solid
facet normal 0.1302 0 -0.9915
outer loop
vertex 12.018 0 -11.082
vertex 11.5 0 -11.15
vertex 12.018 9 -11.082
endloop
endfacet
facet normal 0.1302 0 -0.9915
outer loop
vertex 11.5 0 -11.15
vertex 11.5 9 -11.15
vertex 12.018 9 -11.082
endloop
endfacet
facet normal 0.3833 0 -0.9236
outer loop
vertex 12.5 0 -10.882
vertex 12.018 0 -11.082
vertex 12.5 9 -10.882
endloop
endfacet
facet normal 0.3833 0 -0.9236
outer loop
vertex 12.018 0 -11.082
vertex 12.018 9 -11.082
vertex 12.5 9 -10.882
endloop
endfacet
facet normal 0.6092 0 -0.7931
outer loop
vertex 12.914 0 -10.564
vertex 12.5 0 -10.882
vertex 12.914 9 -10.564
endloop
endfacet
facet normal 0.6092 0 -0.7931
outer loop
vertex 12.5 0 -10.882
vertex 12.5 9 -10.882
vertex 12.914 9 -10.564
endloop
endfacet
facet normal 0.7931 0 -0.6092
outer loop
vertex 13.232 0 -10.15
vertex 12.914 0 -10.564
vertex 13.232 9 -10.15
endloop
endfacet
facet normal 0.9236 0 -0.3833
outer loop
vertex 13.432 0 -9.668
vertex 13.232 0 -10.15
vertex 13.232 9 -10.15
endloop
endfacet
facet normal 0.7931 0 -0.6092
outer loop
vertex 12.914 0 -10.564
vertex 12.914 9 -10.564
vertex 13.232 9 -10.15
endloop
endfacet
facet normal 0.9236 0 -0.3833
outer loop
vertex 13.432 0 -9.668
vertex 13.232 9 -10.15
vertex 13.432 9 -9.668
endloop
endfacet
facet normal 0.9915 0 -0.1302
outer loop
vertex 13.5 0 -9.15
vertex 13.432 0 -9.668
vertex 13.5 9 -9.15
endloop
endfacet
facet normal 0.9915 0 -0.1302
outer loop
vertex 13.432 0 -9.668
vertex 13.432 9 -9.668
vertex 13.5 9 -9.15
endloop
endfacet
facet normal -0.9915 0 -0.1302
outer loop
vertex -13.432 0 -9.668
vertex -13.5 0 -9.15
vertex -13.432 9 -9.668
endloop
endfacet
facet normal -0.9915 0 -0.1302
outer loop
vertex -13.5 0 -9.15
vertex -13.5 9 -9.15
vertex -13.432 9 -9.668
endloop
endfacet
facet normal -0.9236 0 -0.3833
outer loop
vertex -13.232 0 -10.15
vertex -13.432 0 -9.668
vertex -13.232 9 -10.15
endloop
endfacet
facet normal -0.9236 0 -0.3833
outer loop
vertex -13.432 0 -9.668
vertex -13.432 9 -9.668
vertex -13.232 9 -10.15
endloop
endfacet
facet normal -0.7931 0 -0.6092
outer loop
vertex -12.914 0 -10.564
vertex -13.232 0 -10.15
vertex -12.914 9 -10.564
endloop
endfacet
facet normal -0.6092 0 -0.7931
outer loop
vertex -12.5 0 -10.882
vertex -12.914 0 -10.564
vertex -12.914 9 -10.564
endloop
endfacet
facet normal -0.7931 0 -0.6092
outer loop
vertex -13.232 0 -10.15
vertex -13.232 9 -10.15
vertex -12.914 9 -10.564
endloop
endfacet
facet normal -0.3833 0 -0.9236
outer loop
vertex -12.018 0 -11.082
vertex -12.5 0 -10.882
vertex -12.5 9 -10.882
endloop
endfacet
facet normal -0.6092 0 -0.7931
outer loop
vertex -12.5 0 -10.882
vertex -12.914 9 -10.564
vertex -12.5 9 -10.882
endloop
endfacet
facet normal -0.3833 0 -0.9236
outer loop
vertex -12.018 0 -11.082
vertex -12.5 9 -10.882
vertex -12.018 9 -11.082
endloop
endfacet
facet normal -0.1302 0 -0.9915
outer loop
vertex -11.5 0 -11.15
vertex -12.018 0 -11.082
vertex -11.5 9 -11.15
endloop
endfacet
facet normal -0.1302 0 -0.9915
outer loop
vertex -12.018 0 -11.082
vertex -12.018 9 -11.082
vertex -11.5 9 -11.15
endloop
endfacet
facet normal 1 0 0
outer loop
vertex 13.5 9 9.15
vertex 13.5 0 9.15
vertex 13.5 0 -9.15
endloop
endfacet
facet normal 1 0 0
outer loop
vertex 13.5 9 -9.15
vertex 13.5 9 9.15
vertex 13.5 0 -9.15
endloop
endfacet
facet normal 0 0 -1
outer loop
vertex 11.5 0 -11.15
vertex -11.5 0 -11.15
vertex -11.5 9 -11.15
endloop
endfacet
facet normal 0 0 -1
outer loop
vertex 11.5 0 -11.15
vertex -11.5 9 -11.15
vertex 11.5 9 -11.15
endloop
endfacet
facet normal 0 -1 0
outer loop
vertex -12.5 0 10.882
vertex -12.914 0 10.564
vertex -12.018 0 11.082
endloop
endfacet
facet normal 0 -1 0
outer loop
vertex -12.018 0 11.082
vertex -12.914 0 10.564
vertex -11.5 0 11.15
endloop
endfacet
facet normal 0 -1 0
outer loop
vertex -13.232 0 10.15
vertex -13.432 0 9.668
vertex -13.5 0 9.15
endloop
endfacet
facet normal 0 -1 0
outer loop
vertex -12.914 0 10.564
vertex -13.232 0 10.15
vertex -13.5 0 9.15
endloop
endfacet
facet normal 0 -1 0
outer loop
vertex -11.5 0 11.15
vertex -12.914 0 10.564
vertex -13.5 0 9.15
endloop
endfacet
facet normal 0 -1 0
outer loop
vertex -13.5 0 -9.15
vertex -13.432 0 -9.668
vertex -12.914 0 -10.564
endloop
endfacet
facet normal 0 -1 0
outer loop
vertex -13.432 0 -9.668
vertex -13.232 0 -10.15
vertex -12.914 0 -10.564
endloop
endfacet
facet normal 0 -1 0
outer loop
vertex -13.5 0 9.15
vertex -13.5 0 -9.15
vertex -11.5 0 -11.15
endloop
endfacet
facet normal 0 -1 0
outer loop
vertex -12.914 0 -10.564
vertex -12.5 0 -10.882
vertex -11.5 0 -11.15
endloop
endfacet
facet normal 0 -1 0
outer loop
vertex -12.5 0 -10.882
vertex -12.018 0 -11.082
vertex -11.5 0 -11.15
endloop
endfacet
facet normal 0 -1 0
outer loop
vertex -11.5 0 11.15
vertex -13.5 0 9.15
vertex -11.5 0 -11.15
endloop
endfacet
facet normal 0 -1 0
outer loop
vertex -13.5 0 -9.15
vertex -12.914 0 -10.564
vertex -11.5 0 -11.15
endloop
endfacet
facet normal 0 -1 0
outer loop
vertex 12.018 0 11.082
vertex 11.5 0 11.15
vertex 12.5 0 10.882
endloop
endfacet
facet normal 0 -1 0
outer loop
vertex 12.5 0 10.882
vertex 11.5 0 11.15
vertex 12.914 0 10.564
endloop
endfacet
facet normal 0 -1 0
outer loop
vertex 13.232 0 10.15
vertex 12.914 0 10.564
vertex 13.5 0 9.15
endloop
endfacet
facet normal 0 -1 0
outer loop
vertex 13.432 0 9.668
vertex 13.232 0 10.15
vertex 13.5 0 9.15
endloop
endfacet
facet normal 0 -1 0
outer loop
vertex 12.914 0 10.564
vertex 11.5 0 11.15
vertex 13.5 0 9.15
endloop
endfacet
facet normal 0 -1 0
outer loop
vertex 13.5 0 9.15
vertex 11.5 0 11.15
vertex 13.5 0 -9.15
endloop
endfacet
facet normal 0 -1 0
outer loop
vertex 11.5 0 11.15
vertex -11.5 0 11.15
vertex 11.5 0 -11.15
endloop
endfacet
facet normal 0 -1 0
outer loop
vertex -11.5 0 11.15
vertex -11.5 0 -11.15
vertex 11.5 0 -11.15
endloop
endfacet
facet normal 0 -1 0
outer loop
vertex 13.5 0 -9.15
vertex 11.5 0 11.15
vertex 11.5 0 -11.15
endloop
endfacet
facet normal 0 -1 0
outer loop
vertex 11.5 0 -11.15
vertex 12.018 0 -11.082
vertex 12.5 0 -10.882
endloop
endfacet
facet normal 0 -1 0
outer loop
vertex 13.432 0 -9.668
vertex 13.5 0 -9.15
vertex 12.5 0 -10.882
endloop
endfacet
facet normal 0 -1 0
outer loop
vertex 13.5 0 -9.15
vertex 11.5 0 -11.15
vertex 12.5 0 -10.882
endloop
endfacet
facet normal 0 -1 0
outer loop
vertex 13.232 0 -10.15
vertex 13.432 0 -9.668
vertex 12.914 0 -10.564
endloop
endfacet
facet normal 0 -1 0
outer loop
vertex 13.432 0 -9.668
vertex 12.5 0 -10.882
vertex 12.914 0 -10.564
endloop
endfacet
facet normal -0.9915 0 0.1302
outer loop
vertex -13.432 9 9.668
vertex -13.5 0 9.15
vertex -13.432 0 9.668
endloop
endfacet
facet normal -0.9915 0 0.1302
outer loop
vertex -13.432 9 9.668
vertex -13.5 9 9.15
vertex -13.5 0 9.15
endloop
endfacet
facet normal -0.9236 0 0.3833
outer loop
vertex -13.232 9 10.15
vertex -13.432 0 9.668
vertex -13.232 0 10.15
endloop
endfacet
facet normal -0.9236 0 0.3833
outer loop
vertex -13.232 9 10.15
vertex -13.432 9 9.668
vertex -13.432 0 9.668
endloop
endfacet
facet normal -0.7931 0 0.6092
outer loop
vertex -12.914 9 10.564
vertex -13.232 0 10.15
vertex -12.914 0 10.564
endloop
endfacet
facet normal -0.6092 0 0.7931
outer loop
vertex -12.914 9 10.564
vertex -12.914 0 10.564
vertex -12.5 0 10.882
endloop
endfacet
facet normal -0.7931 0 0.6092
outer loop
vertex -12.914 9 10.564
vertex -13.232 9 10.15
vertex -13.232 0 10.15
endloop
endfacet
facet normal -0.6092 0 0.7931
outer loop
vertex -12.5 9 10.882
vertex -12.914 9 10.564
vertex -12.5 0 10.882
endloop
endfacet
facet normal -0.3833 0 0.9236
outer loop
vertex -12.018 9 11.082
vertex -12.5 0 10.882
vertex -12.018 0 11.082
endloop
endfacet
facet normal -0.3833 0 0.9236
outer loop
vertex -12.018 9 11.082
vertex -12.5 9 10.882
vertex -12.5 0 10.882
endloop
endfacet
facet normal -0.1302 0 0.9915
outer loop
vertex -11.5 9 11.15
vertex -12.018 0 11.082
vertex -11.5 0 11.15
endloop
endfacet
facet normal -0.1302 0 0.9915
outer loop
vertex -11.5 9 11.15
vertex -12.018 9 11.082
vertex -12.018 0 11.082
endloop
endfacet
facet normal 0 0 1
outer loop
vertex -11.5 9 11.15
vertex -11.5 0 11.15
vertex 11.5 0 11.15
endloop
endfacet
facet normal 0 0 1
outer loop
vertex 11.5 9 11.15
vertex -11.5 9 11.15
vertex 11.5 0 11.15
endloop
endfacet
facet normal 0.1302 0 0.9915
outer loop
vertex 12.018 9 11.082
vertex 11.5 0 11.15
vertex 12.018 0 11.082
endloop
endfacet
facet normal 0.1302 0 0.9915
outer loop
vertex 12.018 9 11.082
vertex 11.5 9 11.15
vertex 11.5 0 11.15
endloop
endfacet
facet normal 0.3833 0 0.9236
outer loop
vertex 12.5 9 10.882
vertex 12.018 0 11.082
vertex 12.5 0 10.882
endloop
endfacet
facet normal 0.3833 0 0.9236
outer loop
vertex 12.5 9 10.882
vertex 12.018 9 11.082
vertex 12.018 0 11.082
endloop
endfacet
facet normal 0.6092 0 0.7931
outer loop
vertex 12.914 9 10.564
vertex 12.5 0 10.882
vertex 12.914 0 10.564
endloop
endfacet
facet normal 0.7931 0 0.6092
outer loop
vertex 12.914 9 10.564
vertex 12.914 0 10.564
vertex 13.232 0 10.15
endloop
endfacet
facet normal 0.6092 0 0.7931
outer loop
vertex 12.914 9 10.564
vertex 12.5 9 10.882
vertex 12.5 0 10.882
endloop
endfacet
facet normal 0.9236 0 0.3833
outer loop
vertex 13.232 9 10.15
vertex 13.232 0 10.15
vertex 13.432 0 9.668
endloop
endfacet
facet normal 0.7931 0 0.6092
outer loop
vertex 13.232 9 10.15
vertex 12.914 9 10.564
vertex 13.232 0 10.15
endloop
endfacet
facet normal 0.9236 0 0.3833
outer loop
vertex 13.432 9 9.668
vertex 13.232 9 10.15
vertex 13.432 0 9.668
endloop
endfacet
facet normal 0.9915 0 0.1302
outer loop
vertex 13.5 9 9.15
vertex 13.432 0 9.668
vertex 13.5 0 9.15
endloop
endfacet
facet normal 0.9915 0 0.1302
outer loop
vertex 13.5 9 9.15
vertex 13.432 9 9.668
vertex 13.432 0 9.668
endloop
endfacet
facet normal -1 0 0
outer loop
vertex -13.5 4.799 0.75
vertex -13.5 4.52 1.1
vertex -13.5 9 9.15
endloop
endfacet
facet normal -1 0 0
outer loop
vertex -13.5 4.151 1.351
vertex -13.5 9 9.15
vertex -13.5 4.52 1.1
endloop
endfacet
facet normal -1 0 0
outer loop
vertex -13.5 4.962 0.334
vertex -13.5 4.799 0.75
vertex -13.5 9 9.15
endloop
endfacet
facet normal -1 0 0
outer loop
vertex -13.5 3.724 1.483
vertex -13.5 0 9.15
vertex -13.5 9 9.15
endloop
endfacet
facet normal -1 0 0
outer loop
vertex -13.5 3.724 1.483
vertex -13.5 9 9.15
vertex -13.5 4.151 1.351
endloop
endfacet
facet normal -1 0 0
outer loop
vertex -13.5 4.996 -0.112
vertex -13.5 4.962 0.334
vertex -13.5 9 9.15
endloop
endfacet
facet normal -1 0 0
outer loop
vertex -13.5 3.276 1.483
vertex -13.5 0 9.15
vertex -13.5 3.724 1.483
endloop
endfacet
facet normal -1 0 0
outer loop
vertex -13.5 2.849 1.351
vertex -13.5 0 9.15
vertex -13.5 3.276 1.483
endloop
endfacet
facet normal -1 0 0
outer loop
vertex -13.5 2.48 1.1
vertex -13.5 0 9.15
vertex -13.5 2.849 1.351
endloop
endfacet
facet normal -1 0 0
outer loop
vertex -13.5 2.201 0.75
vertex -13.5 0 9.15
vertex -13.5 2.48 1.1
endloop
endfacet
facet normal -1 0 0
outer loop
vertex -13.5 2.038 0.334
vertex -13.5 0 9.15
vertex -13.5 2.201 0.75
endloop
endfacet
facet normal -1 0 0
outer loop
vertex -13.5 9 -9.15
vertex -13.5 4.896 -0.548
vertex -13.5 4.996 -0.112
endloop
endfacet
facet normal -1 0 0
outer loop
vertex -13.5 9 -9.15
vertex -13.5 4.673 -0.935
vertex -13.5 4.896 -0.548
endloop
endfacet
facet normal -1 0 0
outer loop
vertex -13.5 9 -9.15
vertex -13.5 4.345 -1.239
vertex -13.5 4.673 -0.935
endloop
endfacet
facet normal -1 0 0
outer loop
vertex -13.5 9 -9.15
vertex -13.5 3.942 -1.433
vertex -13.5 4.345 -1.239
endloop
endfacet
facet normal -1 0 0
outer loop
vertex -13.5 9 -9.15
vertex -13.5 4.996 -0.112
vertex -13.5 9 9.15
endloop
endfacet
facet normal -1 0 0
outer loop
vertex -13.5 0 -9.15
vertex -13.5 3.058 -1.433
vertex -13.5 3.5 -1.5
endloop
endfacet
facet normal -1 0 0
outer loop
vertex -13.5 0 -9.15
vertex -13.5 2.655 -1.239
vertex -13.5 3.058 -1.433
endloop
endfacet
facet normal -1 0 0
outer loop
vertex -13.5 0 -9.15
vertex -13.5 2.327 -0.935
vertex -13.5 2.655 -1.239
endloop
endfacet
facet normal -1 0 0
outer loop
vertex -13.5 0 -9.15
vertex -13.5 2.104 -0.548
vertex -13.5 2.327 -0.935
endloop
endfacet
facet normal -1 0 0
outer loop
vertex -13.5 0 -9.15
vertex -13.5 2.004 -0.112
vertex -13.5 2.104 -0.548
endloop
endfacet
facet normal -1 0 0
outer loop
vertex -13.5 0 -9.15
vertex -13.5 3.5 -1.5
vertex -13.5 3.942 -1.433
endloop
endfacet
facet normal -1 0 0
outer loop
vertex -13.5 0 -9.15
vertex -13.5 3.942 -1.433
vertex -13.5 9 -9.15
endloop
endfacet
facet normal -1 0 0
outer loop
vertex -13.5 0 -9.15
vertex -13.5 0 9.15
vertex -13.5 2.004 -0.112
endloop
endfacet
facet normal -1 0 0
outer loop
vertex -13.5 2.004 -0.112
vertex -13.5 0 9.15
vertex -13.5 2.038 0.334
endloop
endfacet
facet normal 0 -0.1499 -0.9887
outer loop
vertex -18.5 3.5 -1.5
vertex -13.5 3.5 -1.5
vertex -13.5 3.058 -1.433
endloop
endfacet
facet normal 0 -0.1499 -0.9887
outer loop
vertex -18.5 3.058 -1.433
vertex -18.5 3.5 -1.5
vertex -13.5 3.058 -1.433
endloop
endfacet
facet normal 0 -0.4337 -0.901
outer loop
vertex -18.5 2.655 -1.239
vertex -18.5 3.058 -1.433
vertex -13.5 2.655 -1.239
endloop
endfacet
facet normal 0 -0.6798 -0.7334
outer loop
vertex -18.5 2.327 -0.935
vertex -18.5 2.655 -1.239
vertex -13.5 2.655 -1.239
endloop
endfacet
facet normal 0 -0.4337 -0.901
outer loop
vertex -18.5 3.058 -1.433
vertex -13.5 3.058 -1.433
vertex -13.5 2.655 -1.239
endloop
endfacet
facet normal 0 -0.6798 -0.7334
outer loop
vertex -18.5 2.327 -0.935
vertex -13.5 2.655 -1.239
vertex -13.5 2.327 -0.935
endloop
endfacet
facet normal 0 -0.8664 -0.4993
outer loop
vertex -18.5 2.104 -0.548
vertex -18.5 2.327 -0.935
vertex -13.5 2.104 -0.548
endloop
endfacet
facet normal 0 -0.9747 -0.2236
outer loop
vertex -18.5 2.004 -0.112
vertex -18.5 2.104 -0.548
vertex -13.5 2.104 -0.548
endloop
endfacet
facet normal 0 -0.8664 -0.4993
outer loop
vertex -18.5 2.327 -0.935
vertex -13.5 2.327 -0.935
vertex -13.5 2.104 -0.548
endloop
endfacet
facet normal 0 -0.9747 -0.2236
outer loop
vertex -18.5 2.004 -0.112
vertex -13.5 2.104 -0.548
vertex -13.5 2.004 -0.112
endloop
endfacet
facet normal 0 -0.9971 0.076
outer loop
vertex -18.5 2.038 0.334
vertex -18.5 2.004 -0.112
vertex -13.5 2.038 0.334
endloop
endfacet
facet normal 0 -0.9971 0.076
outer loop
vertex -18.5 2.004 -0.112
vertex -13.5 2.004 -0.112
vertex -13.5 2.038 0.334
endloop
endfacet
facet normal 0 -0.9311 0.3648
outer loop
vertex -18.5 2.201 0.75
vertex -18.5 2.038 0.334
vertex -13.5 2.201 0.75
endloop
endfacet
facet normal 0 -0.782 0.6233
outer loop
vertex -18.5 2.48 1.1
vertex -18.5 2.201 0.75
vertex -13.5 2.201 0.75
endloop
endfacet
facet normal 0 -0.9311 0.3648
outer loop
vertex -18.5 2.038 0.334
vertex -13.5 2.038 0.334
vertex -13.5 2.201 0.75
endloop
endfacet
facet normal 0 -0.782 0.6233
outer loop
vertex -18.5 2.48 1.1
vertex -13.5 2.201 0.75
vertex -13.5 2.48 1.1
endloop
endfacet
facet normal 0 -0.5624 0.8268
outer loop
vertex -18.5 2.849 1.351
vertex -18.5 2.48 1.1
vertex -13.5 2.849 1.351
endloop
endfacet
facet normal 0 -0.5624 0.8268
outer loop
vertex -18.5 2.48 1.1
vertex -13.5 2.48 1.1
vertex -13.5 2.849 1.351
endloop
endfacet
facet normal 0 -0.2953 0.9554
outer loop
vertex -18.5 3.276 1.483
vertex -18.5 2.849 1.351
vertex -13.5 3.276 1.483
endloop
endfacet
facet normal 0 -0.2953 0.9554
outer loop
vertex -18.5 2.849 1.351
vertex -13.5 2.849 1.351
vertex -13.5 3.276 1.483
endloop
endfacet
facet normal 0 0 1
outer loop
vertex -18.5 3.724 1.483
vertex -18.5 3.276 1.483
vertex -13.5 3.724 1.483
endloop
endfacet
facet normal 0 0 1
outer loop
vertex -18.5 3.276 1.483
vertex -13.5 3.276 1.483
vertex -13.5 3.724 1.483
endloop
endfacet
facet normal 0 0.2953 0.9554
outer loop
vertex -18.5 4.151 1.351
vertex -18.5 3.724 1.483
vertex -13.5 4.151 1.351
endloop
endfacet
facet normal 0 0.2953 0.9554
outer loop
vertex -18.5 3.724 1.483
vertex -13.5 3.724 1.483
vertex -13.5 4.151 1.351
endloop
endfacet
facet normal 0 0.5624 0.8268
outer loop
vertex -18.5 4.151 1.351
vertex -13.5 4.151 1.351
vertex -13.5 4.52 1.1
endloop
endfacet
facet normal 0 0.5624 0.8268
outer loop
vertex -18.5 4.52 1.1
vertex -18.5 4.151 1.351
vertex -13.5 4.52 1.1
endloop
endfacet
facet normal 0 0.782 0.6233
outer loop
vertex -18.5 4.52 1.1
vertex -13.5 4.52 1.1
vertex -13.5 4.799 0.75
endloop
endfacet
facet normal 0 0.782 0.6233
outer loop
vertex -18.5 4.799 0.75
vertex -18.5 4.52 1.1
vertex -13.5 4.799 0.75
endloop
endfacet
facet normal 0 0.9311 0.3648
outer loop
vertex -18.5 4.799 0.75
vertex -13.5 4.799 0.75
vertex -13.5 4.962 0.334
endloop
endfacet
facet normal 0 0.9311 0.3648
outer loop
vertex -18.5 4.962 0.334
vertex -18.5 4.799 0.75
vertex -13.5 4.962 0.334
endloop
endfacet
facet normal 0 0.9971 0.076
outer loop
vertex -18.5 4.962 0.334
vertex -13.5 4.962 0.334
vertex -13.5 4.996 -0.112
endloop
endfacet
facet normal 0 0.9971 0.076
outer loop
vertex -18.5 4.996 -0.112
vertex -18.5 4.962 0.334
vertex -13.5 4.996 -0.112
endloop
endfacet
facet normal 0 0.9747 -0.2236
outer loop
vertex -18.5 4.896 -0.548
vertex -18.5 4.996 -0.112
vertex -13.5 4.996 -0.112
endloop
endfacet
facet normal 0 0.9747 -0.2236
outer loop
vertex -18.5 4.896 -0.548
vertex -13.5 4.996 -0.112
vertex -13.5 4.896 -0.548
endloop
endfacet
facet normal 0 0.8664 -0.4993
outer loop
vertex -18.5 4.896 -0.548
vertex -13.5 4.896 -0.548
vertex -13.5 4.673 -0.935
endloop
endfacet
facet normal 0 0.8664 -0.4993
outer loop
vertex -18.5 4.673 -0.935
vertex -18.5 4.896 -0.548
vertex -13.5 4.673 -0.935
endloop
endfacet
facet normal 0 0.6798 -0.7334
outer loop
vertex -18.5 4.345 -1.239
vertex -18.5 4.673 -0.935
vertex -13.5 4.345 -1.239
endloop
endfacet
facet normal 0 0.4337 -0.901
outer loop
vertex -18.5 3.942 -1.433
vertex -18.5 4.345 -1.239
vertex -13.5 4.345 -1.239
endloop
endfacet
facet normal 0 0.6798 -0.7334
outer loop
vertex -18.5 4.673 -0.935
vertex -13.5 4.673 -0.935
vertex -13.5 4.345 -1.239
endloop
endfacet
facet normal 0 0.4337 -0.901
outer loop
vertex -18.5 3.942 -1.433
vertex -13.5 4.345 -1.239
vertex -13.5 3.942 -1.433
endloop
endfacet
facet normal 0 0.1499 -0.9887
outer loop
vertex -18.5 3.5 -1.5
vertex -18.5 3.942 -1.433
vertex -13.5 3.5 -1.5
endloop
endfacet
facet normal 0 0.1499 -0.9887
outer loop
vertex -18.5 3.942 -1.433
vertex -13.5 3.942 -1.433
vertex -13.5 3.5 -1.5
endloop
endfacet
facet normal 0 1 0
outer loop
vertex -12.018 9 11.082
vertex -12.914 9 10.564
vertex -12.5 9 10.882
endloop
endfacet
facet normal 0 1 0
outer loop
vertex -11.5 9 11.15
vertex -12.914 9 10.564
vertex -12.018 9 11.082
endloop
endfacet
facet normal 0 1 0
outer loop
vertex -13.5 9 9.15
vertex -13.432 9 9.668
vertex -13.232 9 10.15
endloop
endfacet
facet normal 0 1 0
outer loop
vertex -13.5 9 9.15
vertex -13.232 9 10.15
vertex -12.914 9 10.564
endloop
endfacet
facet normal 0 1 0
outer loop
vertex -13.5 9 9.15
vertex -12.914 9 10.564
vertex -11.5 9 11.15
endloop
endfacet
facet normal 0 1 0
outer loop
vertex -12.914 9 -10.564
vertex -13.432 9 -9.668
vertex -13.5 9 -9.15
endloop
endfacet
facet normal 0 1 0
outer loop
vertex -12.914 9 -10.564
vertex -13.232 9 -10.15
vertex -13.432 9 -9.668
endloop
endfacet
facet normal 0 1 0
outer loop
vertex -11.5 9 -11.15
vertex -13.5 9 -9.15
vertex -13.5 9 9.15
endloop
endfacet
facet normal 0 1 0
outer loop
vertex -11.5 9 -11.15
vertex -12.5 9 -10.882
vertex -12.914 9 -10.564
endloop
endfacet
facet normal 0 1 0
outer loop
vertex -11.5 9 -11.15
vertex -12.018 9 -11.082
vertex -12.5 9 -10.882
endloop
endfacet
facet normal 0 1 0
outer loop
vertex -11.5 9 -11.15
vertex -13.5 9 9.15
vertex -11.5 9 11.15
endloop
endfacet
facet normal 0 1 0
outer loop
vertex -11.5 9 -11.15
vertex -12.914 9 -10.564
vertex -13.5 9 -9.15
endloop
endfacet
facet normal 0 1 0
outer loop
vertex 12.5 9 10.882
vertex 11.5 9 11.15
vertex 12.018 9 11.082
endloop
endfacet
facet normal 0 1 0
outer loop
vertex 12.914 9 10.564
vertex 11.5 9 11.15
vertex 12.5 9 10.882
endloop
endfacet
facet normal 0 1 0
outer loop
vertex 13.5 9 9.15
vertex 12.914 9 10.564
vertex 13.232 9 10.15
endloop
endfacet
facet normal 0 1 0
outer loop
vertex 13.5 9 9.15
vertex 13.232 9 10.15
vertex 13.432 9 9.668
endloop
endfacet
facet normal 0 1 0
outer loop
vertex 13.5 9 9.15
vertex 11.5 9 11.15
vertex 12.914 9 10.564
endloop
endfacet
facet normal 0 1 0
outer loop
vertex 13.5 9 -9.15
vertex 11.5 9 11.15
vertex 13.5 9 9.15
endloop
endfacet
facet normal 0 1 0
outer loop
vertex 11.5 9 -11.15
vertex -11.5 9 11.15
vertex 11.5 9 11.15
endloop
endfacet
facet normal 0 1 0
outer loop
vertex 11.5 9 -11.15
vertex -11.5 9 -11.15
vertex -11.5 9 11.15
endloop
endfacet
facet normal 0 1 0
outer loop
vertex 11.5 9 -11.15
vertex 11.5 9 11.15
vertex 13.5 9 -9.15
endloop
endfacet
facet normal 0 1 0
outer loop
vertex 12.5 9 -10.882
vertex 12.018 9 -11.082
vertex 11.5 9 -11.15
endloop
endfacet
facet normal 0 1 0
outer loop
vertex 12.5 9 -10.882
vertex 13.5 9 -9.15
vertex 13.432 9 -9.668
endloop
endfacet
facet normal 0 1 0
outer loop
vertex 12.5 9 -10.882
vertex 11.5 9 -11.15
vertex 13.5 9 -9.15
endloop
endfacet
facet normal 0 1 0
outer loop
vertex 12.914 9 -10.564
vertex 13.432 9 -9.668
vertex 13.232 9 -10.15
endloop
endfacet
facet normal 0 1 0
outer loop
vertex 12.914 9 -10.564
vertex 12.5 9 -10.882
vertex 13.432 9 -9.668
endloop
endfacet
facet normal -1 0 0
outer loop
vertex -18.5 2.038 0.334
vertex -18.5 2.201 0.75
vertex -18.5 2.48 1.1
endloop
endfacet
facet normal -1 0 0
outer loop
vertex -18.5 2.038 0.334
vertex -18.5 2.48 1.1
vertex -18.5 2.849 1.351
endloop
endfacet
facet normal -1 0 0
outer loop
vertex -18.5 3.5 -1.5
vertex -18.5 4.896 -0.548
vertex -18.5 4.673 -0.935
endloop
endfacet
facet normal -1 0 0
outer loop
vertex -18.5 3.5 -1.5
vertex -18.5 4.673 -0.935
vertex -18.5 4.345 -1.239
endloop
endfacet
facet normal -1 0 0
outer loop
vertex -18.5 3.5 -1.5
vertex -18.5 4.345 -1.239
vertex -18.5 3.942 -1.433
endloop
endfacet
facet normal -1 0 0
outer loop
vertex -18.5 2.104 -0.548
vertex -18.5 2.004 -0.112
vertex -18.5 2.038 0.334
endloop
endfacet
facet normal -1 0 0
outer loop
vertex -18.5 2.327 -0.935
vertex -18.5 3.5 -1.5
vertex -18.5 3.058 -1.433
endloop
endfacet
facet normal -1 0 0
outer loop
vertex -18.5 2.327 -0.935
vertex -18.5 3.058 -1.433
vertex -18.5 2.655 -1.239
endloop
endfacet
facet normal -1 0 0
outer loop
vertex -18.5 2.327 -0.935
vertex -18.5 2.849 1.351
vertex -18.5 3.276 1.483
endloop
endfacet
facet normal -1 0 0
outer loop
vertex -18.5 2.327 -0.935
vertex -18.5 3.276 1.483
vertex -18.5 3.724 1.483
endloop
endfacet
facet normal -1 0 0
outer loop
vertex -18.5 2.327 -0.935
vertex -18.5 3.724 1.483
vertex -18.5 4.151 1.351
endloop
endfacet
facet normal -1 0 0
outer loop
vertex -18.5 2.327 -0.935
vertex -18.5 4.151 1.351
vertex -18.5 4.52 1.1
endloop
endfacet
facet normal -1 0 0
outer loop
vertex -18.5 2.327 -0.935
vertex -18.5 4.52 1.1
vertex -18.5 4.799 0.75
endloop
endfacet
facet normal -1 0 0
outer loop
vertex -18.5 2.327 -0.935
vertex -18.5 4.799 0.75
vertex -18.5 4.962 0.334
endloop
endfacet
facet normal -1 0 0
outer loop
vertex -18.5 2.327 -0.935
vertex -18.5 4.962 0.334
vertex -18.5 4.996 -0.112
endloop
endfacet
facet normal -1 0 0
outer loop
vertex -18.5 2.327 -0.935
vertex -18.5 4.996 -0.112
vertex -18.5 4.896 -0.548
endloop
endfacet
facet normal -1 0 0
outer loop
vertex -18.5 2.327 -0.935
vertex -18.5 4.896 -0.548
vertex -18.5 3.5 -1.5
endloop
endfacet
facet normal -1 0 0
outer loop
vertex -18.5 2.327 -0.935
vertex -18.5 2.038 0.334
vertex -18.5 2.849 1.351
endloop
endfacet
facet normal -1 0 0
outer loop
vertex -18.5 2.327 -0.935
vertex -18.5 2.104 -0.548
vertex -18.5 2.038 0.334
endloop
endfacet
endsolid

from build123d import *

# Parameters (mm, degrees)
SKETCH1_W           = 27
SKETCH1_H           = 22.3
BOSS_EXTRUDE1_DEPTH = 9
SKETCH2_R           = 1.5
BOSS_EXTRUDE3_DEPTH = 5
FILLET1_R           = 2


with BuildPart() as part:
    # Sketch1 → Boss-Extrude1 (new body)
    with BuildSketch(Plane(origin=(0, 0, 0), x_dir=(1, 0, 0), z_dir=(0, 1, 0))):
        Rectangle(SKETCH1_W, SKETCH1_H)
    extrude(amount=BOSS_EXTRUDE1_DEPTH)

    # Sketch2 → Boss-Extrude3 (add)
    with BuildSketch(Plane.ZY.offset(13.5)):
        with Locations(Location((0, 3.5, 0), (0, 0, 180))):
            Circle(SKETCH2_R)
    extrude(amount=BOSS_EXTRUDE3_DEPTH)

    # Fillet1
    fillet1_edges = [part.edges().sort_by_distance(p)[0] for p in [
        (13.5, 4.5, 11.15),
        (-13.5, 4.5, 11.15),
        (-13.5, 4.5, -11.15),
        (13.5, 4.5, -11.15),
    ]]
    fillet(fillet1_edges, radius=FILLET1_R)


solid = part.part
